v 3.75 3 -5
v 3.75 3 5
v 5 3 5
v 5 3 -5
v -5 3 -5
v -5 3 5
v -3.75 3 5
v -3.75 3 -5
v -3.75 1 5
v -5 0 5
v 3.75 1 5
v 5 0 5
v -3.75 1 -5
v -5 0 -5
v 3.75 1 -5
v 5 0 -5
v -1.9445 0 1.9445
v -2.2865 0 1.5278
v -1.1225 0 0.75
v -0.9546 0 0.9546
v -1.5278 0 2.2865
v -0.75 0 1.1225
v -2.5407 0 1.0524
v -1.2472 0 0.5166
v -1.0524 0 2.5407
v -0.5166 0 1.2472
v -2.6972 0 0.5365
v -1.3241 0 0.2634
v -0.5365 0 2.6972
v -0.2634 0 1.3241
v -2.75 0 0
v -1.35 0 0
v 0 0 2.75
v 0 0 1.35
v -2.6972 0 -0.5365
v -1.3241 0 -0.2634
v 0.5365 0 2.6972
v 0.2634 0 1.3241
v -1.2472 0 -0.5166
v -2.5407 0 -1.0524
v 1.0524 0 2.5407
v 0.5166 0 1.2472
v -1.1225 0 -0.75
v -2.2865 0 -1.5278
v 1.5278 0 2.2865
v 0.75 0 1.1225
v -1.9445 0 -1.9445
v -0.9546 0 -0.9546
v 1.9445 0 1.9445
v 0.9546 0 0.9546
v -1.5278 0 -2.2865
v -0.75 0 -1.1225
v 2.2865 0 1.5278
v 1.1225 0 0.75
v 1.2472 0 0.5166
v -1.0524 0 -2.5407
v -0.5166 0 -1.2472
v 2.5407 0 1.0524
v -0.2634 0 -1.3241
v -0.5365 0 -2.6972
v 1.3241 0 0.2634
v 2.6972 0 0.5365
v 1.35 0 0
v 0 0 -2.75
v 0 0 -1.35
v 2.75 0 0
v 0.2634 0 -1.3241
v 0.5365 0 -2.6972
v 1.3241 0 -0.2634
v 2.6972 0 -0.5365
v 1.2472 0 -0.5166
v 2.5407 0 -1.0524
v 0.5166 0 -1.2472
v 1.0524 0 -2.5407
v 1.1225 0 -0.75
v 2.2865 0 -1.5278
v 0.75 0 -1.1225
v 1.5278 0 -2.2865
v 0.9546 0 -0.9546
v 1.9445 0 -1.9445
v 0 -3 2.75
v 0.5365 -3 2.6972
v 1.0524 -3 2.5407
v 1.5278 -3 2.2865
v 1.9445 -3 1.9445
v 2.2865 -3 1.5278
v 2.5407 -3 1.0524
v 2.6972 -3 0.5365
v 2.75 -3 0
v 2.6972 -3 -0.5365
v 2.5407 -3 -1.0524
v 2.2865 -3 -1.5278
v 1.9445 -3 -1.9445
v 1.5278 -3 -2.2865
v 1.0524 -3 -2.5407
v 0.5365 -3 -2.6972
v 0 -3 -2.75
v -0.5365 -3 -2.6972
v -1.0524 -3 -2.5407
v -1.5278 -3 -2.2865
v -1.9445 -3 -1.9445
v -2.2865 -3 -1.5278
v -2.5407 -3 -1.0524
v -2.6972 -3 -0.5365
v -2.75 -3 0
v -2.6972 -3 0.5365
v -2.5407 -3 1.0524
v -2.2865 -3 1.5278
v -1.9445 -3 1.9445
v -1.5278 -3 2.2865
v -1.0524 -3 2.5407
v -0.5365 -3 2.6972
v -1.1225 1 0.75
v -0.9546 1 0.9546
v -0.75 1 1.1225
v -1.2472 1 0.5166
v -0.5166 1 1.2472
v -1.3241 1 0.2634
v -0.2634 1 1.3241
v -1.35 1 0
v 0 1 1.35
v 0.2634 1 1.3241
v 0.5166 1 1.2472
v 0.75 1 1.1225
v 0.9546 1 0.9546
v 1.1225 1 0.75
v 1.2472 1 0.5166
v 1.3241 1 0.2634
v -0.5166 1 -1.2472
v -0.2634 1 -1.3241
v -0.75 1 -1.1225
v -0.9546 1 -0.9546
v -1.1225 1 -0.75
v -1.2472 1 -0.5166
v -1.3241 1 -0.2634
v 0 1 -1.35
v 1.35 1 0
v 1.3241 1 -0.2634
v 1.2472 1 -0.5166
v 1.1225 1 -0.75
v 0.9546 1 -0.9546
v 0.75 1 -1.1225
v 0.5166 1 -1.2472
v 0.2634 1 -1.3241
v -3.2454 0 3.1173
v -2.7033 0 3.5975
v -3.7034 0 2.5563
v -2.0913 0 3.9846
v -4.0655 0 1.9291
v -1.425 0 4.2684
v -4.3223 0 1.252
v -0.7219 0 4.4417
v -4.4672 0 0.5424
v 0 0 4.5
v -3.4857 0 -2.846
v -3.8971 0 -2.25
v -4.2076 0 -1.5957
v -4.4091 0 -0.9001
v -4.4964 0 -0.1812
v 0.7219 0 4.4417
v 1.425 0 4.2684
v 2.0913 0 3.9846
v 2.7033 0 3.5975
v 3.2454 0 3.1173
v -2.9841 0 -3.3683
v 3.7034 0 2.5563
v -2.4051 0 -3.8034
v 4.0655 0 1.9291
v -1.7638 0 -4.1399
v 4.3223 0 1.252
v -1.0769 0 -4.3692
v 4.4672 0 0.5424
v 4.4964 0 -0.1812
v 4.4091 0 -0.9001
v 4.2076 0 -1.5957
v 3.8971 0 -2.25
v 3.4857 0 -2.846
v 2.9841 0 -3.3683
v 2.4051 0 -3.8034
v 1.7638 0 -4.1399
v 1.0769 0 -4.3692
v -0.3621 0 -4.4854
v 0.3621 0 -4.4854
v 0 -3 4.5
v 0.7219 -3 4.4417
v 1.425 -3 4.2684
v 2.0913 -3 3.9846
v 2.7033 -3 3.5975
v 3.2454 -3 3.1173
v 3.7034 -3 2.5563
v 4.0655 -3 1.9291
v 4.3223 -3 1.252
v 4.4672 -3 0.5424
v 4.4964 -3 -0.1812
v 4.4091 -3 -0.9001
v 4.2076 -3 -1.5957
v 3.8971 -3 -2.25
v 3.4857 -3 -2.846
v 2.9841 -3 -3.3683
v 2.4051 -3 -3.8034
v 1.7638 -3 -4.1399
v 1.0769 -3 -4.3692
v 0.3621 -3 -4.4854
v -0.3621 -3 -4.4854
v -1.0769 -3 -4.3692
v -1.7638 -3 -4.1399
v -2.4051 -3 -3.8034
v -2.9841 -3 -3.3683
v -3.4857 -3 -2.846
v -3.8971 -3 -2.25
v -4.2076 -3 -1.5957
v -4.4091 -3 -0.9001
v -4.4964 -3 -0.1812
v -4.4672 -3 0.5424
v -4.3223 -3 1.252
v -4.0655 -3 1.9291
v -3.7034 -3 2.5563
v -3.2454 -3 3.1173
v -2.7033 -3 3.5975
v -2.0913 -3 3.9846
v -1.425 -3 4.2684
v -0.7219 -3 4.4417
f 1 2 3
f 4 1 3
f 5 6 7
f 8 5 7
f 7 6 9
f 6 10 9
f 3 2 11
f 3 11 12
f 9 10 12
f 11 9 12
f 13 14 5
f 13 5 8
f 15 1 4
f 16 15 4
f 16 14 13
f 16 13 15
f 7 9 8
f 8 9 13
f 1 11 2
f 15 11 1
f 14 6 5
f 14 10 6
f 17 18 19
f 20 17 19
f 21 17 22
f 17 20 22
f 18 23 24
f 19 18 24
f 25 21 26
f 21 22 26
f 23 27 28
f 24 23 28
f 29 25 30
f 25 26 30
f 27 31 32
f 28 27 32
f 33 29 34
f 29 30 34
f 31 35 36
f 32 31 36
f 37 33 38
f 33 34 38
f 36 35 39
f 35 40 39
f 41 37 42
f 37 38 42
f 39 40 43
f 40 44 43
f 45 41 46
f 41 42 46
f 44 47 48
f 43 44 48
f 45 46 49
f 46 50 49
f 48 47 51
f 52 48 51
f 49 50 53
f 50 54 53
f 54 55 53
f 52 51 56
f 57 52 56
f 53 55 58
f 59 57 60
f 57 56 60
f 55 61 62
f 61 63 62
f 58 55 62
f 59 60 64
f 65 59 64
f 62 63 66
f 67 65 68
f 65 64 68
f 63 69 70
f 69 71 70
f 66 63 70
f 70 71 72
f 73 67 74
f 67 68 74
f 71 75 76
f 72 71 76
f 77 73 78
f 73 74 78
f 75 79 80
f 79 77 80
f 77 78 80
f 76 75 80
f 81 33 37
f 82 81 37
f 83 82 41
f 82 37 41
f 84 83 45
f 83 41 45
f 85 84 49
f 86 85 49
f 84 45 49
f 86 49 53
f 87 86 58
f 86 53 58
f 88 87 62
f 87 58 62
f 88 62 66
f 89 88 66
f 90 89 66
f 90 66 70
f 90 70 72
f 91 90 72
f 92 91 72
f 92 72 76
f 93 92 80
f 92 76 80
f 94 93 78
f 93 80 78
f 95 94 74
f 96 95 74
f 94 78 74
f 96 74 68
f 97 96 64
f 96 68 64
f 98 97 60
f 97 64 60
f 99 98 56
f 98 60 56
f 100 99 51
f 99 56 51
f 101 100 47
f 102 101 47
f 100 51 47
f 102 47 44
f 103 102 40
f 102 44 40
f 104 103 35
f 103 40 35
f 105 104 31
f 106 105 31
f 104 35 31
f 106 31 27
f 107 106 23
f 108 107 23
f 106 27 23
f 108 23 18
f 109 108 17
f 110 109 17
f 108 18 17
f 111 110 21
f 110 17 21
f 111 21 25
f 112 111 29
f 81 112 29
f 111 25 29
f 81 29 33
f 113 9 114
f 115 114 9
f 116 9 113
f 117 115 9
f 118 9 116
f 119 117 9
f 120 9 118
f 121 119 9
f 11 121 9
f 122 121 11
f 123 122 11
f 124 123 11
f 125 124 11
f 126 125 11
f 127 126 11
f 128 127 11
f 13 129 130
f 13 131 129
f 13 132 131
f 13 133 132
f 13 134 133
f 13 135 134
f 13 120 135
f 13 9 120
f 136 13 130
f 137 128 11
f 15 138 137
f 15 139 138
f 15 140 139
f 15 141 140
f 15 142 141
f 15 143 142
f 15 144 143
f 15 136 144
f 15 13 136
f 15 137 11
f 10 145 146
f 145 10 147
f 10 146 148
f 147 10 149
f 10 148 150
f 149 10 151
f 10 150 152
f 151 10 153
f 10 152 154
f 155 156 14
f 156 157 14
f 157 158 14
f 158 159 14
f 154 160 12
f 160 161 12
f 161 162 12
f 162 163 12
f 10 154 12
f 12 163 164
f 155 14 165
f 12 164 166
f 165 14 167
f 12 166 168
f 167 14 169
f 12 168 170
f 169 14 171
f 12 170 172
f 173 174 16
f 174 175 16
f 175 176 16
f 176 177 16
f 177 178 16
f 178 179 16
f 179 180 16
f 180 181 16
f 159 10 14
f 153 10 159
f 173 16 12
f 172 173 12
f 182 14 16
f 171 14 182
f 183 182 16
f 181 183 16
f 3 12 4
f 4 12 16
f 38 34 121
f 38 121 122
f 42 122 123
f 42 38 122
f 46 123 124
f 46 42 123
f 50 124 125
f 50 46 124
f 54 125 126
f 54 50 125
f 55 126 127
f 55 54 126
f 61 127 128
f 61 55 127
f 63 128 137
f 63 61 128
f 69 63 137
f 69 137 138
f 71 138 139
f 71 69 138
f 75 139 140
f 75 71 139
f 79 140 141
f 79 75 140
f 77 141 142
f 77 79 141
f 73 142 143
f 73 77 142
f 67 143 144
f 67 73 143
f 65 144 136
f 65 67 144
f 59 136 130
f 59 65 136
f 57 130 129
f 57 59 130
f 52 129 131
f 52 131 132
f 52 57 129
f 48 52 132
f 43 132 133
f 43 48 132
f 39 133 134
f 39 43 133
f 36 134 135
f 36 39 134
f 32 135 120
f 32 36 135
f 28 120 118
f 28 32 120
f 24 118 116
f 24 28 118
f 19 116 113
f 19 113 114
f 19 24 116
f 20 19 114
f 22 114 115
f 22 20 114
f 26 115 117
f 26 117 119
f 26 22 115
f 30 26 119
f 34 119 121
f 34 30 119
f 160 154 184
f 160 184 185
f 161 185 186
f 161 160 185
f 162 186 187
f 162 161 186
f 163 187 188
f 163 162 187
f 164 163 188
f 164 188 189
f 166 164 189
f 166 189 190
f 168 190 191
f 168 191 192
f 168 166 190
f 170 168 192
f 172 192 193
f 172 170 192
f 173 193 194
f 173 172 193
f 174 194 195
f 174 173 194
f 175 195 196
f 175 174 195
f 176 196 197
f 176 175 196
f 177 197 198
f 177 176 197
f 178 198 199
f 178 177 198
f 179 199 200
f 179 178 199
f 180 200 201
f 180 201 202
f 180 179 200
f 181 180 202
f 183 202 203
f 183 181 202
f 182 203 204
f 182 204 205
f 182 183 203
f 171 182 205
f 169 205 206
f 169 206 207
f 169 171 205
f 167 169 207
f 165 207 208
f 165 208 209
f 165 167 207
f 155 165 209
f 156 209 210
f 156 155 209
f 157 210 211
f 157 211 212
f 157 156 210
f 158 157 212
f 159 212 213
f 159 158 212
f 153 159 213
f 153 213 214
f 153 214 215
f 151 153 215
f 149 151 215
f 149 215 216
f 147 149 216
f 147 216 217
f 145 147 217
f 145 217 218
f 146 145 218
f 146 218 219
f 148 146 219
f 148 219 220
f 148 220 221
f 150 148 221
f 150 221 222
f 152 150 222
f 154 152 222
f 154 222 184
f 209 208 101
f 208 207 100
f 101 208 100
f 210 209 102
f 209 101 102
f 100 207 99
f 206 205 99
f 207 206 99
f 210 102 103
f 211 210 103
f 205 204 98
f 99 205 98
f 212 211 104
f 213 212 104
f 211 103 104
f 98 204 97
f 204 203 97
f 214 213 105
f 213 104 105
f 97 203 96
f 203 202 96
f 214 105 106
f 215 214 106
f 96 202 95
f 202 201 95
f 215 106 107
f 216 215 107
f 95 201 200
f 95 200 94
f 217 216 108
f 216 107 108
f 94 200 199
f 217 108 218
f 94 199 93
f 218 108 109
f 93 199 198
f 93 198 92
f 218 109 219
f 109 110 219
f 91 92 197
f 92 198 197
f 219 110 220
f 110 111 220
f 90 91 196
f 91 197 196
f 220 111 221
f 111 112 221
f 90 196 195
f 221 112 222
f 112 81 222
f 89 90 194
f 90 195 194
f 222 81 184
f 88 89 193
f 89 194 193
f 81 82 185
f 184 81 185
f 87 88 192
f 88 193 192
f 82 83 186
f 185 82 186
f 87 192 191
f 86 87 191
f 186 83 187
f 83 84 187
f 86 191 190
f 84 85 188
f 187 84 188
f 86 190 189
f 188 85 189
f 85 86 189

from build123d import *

# Parameters (mm, degrees)
ESQUISSE1_R        = 4.5
ESQUISSE1_R_2      = 2.75
BOSS_EXTRU_1_DEPTH = 3
ESQUISSE3_W        = 10
ESQUISSE3_H        = 10
ESQUISSE3_R        = 1.35
BOSS_EXTRU_2_DEPTH = 1
ESQUISSE4_W        = 1.25
ESQUISSE4_H        = 10
BOSS_EXTRU_3_DEPTH = 2


with BuildPart() as part:
    # Esquisse1 → Boss.-Extru.1 (new body)
    with BuildSketch(Plane(origin=(0, 0, 0), x_dir=(1, 0, 0), z_dir=(0, 1, 0))):
        with Locations(Location((0, 0, 0), (0, 0, 270))):
            Circle(ESQUISSE1_R)
        with Locations(Location((0, 0, 0), (0, 0, 270))):
            Circle(ESQUISSE1_R_2, mode=Mode.SUBTRACT)
    extrude(amount=-BOSS_EXTRU_1_DEPTH)

    # Esquisse3 → Boss.-Extru.2 (add)
    with BuildSketch(Plane(origin=(0, 0, 0), x_dir=(1, 0, 0), z_dir=(0, 1, 0))):
        Rectangle(ESQUISSE3_W, ESQUISSE3_H)
        with Locations(Location((0, 0, 0), (0, 0, 270))):
            Circle(ESQUISSE3_R, mode=Mode.SUBTRACT)
    extrude(amount=BOSS_EXTRU_2_DEPTH)

    # Esquisse4 → Boss.-Extru.3 (add)
    with BuildSketch(Plane(origin=(0, 1, 0), x_dir=(1, 0, 0), z_dir=(0, 1, 0))):
        with Locations((-4.375, 0)):
            Rectangle(ESQUISSE4_W, ESQUISSE4_H)
        with Locations((4.375, 0)):
            Rectangle(ESQUISSE4_W, ESQUISSE4_H)
    extrude(amount=BOSS_EXTRU_3_DEPTH)


solid = part.part
